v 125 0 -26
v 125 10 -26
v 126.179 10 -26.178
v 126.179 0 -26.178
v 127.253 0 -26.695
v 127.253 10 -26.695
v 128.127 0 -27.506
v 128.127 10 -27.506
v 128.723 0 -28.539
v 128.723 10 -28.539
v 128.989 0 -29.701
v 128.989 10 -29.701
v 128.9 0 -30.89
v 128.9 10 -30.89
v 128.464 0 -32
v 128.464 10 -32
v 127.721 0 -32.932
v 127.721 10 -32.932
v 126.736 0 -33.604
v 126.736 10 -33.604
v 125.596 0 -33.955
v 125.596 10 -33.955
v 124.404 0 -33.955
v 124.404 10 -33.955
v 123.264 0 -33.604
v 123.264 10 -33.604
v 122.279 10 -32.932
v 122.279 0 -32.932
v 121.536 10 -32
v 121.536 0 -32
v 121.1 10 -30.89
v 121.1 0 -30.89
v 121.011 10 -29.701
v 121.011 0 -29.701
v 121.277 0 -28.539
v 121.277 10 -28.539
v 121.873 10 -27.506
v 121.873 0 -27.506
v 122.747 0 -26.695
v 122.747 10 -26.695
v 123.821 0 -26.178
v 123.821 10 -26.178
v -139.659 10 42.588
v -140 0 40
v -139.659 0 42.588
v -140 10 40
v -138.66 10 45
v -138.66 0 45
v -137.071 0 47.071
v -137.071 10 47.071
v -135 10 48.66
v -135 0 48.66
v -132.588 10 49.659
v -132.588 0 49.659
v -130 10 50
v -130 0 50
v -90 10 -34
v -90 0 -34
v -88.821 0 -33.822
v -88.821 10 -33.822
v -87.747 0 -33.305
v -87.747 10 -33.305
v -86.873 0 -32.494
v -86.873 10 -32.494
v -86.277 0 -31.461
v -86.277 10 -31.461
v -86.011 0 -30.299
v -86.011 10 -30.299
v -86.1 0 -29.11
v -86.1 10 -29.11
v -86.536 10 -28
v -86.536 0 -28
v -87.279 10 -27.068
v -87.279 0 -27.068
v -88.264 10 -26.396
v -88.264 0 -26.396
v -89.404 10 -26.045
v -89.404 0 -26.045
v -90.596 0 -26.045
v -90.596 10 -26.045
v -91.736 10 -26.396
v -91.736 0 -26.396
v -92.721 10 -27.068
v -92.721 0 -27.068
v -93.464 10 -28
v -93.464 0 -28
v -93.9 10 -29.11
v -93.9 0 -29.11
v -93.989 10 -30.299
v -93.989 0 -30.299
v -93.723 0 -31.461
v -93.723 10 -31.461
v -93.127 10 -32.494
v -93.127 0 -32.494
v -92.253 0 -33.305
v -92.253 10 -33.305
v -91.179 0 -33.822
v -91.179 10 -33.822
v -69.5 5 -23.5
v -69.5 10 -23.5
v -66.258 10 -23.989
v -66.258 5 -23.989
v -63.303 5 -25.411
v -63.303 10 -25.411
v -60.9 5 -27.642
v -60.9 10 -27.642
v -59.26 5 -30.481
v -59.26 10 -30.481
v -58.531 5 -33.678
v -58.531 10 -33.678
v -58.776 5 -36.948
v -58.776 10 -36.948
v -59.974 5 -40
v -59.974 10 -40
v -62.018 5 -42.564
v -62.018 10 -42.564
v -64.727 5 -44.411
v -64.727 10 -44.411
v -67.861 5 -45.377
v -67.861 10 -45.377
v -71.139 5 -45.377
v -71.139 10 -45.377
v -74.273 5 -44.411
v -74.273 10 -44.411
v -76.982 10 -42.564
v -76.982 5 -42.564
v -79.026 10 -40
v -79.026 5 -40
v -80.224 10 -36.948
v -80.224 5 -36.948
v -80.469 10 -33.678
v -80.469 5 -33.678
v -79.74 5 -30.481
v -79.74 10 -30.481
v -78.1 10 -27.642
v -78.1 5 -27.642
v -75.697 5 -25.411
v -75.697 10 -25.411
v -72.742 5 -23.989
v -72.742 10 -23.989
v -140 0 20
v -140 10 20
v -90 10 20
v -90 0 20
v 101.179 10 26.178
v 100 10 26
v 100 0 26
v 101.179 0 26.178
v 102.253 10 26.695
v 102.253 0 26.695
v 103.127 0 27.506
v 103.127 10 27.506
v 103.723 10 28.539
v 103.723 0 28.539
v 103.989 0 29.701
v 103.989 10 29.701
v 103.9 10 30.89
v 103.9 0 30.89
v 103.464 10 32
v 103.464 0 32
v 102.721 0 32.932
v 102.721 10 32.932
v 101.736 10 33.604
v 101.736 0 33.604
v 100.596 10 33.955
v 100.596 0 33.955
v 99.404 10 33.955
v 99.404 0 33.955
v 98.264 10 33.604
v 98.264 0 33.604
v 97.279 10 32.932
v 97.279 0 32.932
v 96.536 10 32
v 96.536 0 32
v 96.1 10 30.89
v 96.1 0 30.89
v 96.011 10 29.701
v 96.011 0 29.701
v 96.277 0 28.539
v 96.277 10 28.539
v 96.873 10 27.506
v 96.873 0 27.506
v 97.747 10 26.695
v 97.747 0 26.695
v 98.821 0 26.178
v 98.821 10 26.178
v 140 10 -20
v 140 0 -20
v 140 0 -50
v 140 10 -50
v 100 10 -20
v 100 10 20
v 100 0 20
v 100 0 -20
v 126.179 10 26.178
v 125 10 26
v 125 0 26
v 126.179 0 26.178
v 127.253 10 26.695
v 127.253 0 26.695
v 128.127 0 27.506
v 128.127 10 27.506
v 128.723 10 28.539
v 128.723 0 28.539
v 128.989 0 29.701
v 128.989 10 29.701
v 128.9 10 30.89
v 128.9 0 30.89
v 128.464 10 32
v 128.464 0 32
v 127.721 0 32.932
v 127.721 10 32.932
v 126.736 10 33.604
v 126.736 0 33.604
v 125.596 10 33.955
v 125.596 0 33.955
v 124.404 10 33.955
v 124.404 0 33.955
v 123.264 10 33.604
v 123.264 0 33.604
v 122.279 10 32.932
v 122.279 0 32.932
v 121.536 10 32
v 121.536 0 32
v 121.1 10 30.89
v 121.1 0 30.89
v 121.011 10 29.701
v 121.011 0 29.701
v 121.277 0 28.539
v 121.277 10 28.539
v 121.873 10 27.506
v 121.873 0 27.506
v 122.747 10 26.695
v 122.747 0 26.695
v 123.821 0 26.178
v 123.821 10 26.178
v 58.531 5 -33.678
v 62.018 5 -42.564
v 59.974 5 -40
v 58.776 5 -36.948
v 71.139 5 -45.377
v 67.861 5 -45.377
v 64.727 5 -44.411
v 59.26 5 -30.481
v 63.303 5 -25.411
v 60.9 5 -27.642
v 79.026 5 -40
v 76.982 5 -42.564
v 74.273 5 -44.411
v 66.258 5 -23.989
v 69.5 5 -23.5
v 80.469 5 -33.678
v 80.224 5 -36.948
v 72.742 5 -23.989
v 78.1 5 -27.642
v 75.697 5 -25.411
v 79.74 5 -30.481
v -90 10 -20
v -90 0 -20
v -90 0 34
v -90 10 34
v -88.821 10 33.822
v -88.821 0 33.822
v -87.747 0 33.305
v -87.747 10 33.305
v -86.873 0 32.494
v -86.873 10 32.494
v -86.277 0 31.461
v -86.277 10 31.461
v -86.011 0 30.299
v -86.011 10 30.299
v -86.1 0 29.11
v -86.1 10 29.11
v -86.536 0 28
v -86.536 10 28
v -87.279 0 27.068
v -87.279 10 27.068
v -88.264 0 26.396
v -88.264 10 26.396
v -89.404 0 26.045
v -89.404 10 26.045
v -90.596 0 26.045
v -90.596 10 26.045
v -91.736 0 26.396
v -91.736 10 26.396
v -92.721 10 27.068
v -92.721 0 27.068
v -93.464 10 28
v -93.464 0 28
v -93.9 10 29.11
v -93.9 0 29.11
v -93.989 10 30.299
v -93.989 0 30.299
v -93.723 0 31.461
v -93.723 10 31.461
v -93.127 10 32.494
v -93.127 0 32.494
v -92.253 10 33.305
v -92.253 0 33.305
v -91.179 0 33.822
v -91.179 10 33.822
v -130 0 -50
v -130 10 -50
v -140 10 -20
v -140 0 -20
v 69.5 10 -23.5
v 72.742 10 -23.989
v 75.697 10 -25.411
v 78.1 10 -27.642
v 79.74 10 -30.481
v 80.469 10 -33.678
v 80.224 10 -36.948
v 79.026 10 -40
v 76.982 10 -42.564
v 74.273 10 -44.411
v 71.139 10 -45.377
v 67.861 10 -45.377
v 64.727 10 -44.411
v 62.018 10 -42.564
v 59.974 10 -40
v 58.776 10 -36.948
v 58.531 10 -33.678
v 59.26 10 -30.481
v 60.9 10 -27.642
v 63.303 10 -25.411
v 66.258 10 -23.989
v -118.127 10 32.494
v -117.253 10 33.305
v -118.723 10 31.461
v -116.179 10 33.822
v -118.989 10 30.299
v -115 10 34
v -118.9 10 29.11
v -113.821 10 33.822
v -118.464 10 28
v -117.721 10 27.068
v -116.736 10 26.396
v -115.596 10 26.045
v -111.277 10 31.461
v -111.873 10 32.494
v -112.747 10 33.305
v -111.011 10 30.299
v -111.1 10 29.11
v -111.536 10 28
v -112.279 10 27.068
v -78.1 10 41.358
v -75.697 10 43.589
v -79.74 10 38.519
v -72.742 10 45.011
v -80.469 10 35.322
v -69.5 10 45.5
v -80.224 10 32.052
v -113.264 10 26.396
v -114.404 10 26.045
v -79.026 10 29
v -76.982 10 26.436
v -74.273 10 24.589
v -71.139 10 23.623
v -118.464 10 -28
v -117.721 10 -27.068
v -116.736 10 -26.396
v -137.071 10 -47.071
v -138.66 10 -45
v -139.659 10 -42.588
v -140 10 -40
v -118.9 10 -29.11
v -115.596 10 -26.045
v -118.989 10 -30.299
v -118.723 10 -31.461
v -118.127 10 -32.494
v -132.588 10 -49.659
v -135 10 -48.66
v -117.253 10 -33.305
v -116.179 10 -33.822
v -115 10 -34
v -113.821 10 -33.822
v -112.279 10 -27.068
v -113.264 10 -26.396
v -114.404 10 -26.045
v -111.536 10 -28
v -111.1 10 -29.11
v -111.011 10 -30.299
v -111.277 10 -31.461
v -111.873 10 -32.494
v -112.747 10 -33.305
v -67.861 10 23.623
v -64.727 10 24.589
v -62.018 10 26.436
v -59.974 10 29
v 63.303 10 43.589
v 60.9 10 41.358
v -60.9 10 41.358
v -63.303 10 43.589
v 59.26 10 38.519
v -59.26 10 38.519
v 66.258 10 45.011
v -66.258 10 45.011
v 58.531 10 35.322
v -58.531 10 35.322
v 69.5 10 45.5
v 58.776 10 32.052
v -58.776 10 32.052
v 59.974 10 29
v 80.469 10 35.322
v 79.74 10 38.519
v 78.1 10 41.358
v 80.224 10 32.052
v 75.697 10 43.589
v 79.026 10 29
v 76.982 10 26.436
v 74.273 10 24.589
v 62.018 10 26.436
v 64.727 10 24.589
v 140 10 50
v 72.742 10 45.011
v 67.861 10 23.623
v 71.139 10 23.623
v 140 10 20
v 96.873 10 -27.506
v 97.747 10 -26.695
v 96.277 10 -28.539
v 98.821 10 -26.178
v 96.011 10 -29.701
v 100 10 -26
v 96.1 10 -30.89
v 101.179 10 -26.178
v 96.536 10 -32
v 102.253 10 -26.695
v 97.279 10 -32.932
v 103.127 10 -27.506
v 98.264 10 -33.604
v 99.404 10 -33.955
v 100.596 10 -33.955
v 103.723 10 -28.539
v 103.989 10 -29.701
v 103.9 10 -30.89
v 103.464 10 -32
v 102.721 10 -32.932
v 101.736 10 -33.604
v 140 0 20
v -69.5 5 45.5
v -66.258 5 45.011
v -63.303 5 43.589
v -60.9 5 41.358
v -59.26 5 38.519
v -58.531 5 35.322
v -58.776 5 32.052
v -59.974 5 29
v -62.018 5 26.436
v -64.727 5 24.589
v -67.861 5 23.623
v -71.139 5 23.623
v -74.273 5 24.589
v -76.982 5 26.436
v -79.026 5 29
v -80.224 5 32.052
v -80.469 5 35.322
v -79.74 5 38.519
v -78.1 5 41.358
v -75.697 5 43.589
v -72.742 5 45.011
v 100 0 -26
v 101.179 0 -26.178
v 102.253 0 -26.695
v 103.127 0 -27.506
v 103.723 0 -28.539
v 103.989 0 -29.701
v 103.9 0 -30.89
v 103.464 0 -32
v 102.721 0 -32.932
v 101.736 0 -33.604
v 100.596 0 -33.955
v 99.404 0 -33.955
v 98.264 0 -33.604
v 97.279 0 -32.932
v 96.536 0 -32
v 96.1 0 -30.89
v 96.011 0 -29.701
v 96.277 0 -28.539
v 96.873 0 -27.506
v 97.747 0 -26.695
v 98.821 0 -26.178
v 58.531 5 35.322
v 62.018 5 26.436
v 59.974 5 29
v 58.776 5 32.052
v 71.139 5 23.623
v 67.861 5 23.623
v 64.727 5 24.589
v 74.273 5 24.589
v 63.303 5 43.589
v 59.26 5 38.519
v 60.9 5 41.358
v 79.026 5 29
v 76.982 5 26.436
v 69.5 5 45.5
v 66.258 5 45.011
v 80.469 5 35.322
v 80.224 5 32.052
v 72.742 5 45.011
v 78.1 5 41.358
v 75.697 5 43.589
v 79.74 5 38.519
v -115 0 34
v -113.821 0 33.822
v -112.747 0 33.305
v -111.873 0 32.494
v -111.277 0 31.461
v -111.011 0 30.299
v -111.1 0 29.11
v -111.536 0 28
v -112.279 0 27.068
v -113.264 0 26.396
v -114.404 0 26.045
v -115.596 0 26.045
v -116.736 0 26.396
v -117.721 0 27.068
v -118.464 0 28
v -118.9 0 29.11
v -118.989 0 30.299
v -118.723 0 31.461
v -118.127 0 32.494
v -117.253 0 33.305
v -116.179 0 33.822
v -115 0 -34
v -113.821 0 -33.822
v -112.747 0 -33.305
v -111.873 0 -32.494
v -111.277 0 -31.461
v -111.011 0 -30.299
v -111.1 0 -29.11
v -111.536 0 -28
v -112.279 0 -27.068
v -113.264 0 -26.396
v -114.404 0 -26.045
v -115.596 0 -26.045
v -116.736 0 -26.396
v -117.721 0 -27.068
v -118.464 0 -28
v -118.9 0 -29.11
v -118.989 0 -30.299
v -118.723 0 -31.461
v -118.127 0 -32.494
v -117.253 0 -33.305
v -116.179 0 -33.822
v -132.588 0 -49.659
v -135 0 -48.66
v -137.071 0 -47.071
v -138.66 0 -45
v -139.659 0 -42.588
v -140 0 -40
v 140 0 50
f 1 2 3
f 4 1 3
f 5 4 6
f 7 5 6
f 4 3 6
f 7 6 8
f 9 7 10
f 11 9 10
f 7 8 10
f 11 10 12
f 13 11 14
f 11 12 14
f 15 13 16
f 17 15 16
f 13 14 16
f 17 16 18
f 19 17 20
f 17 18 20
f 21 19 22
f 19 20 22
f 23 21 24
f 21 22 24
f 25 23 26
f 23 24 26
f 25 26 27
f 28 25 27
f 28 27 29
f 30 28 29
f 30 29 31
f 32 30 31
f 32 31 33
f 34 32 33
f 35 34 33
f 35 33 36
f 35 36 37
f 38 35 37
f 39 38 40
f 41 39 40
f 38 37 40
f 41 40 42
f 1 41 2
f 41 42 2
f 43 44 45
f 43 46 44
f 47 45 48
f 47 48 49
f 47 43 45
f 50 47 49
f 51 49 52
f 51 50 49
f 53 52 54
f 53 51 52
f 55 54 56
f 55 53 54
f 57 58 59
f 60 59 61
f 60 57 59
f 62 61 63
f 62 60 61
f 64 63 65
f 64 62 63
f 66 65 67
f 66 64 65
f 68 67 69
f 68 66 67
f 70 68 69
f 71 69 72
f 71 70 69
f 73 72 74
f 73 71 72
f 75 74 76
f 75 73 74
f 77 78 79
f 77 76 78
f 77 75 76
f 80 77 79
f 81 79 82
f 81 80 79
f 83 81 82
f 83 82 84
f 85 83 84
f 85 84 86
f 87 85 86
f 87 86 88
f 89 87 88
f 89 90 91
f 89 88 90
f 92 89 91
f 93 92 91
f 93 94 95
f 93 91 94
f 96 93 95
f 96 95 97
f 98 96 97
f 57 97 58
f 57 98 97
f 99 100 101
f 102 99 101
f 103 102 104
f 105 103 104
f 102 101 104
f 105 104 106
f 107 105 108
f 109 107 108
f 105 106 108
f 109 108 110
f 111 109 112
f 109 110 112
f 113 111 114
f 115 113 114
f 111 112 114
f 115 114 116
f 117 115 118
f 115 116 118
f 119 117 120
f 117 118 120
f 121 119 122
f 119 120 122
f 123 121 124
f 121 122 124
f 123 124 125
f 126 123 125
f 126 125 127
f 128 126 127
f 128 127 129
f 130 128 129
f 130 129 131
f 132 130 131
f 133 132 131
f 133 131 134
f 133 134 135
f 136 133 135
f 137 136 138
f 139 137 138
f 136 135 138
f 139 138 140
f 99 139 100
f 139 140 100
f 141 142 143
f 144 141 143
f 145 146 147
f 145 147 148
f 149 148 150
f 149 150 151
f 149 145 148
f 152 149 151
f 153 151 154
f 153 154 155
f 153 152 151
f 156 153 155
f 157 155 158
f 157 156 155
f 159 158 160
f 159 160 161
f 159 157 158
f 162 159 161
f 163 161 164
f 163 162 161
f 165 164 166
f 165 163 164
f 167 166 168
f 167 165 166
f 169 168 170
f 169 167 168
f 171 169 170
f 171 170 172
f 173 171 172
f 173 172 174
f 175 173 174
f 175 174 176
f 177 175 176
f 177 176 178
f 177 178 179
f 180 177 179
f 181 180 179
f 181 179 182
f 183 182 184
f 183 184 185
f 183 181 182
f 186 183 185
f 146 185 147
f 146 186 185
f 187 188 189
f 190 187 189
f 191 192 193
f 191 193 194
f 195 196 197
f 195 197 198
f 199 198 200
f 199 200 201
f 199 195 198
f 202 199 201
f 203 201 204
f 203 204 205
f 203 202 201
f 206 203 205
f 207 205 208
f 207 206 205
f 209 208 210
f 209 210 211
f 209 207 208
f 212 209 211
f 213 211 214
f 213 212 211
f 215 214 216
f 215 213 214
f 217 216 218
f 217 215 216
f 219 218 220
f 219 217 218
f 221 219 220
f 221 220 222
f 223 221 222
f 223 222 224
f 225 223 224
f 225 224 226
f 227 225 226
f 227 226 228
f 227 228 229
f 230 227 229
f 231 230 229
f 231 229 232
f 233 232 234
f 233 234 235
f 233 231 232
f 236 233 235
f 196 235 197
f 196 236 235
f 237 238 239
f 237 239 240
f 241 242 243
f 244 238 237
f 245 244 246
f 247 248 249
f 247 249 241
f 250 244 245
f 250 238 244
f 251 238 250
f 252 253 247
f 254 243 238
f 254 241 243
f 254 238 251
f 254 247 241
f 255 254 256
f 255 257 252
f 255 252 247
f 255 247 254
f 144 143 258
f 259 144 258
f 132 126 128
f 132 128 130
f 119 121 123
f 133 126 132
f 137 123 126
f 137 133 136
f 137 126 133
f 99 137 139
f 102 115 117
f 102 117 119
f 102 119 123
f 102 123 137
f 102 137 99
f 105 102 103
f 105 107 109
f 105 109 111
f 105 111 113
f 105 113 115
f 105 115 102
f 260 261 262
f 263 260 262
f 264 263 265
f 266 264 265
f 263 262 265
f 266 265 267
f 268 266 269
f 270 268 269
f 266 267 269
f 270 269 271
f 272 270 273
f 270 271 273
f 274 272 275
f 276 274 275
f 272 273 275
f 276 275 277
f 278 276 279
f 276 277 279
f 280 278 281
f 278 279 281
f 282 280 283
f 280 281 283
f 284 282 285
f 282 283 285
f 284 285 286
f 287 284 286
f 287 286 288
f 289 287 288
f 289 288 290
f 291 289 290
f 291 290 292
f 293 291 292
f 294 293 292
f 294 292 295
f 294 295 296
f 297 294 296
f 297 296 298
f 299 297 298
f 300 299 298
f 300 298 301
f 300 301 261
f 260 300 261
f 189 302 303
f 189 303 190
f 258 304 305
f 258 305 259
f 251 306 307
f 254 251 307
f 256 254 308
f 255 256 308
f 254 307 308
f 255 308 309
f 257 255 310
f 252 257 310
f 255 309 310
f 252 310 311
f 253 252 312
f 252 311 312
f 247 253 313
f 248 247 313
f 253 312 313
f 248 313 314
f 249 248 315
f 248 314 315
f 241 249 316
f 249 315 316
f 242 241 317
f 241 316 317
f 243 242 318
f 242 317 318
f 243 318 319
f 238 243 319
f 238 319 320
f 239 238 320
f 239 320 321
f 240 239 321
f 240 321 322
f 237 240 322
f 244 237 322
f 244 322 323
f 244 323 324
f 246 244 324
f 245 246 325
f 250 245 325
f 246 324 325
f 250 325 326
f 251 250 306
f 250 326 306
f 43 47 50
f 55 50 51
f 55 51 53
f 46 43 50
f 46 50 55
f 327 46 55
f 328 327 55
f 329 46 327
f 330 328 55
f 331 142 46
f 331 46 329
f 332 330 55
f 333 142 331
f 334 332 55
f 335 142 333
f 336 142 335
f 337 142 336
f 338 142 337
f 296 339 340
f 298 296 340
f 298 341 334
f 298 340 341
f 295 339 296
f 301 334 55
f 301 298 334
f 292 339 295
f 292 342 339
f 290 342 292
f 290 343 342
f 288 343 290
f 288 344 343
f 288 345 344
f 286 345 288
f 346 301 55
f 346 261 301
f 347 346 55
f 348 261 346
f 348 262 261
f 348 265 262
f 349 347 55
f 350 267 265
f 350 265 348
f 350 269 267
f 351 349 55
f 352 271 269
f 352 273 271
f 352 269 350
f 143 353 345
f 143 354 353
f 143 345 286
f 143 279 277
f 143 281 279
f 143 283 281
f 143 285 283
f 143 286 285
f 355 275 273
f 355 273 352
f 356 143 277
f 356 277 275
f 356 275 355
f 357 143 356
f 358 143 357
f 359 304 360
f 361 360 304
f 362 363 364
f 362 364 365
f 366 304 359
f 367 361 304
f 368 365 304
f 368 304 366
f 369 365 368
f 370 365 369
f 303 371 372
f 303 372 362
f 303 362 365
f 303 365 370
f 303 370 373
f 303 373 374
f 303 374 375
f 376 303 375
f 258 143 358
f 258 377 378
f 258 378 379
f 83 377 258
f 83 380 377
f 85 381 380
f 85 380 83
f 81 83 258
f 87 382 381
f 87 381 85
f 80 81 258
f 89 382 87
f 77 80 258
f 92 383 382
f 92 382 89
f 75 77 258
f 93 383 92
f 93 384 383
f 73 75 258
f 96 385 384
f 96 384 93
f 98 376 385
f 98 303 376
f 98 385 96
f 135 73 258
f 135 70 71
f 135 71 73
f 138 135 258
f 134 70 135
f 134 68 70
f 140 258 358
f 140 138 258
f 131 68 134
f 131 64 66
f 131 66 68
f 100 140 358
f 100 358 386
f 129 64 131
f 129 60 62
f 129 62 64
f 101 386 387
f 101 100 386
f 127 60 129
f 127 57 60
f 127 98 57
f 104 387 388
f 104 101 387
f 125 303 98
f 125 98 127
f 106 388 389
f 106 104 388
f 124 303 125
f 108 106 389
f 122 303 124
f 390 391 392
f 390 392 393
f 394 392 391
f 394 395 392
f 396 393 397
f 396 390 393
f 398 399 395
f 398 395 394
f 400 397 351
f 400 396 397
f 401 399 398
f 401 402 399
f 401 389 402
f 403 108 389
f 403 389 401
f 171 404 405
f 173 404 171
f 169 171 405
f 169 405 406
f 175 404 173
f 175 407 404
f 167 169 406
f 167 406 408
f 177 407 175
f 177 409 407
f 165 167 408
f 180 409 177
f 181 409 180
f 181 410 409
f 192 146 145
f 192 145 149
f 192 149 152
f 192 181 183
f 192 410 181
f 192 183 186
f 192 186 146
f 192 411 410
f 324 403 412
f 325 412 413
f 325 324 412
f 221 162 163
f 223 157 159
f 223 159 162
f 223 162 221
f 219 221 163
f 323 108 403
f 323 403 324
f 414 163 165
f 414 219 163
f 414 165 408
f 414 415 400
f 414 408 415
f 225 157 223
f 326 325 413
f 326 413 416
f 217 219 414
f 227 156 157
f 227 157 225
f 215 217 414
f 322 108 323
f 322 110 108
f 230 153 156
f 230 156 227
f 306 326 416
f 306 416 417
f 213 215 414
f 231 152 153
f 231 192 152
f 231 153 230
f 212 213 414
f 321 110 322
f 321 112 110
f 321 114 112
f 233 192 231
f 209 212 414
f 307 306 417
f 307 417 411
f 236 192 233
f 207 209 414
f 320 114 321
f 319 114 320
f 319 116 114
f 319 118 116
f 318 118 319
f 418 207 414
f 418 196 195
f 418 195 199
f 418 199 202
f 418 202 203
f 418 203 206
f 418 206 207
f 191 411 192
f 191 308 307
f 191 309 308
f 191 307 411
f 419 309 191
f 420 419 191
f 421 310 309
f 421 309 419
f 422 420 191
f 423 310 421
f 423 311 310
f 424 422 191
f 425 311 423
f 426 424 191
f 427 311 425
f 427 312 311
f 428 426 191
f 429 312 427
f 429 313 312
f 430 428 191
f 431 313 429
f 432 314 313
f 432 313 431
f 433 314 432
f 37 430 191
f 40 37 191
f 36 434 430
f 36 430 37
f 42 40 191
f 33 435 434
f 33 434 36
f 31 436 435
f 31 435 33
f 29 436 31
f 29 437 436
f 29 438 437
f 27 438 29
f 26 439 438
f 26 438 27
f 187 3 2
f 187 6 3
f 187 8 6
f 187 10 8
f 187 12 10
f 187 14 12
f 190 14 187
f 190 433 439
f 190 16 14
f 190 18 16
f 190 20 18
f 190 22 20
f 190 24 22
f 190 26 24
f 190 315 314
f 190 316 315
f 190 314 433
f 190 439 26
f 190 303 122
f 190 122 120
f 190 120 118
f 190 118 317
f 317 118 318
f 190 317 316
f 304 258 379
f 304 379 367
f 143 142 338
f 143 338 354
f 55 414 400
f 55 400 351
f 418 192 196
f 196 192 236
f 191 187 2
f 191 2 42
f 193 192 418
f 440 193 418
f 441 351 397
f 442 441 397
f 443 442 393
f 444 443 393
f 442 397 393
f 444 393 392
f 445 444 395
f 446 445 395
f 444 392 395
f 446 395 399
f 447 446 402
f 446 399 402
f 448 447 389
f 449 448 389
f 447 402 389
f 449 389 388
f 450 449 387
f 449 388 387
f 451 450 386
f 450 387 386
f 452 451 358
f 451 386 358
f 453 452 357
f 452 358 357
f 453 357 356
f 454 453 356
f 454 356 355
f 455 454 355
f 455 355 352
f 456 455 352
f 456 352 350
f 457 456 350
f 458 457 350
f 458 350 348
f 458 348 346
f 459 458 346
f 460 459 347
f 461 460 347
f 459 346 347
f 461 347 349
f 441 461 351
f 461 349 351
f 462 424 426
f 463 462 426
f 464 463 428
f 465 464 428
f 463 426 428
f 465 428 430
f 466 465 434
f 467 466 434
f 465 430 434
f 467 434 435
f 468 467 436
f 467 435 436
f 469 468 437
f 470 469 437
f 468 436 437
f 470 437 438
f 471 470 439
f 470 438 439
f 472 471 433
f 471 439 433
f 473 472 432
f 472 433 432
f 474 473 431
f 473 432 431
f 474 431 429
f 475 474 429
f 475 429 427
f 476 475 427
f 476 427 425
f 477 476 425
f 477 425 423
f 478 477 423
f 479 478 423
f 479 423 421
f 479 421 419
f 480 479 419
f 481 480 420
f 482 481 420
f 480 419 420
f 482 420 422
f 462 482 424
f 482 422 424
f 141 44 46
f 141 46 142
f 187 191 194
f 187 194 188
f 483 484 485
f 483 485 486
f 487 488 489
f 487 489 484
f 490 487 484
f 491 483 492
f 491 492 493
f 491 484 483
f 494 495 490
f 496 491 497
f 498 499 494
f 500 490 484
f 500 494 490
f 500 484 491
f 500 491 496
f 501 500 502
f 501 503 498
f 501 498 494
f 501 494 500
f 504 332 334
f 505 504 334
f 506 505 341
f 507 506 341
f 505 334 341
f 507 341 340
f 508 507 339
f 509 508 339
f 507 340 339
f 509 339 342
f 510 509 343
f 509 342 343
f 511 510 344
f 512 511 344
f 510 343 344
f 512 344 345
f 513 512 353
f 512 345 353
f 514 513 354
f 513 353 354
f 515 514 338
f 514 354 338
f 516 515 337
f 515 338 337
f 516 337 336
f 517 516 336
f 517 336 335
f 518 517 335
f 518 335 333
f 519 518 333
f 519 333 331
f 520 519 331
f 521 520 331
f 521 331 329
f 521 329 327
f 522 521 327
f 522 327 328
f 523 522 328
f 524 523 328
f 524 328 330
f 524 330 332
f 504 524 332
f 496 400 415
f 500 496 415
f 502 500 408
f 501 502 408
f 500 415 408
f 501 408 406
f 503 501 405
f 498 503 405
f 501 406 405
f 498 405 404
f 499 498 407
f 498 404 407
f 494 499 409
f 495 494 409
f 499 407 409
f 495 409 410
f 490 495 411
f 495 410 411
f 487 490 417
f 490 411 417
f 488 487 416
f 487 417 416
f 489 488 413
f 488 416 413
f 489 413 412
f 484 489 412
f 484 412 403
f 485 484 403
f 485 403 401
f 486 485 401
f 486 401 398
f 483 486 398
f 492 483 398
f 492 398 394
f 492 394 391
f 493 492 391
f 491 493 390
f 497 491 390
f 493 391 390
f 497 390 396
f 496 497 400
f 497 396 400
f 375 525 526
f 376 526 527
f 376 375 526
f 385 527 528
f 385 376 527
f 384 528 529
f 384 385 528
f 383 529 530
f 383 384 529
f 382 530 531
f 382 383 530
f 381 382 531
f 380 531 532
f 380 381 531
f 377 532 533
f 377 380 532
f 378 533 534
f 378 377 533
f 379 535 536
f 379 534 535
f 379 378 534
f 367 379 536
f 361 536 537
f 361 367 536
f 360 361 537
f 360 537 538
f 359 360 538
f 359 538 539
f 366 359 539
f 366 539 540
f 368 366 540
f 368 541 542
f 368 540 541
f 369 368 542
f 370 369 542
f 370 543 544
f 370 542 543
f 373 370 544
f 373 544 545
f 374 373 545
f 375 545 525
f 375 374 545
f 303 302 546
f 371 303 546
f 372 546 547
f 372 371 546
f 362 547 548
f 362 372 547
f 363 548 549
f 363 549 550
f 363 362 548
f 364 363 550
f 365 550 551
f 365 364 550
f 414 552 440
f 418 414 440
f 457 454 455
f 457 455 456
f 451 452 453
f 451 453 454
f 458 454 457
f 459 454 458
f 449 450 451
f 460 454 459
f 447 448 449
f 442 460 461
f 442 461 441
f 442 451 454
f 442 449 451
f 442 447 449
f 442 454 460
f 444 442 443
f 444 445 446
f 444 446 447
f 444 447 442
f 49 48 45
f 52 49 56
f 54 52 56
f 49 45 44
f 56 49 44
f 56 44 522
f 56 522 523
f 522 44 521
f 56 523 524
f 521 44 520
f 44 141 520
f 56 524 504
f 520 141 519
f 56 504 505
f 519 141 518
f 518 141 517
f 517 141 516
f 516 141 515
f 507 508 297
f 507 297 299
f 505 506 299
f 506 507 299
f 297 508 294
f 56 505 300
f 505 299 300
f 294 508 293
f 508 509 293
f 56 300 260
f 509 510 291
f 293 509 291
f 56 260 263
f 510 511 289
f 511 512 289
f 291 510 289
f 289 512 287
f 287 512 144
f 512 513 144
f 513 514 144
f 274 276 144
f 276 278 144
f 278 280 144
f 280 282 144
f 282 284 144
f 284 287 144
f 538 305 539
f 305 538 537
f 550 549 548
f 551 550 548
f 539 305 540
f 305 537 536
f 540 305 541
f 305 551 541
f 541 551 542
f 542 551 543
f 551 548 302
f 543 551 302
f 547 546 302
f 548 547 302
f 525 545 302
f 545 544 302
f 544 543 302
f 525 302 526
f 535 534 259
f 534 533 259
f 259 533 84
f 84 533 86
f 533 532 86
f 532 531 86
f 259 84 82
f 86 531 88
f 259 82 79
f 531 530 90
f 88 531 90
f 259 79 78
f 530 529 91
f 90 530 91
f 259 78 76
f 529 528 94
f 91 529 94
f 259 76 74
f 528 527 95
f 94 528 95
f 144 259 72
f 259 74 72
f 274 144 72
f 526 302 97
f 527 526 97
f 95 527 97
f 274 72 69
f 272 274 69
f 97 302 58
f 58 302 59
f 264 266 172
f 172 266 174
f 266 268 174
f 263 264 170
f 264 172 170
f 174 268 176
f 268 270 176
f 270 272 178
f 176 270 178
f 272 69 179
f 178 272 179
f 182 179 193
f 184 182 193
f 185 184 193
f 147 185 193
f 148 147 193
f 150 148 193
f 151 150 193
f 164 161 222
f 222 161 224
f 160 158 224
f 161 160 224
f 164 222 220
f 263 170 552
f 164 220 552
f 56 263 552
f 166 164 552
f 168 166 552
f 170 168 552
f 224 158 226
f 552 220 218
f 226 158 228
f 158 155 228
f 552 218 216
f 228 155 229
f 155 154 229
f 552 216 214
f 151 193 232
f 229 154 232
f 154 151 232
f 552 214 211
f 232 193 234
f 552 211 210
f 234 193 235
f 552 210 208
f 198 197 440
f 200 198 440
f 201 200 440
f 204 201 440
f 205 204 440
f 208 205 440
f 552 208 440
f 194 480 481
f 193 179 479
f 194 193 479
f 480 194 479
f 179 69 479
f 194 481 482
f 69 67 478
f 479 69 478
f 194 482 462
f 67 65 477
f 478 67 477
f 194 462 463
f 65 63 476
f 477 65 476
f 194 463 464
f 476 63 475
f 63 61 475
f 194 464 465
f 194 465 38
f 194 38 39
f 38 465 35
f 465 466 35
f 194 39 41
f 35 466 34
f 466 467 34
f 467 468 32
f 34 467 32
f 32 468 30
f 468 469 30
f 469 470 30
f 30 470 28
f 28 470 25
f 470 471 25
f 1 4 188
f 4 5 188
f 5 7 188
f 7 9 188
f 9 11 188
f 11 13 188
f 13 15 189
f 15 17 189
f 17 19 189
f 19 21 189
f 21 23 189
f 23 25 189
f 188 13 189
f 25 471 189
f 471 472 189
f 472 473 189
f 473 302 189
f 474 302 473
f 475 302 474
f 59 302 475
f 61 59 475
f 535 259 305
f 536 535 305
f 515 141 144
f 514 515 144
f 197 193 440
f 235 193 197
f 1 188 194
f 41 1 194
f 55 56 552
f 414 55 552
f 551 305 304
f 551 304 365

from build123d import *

# Parameters (mm, degrees)
SKETCH_3_W          = 280
SKETCH_3_H          = 100
EXTRUDE_1_DEPTH     = 10
SKETCH_5_R          = 4
CUT_EXTRUDE_1_DEPTH = 149.996644258
SKETCH_6_R          = 4
CUT_EXTRUDE_2_DEPTH = 10
SKETCH_7_W          = 50
SKETCH_7_H          = 40
CUT_EXTRUDE_3_DEPTH = 149.996644258
FILLET_1_R          = 10
FILLET_2_R          = 10
SKETCH_8_W          = 40
SKETCH_8_H          = 40
CUT_EXTRUDE_4_DEPTH = 149.996644258
SKETCH_11_R         = 11
CUT_EXTRUDE_5_DEPTH = 5


with BuildPart() as part:
    # 草图3 → 凸台-拉伸1 (new body)
    with BuildSketch(Plane(origin=(0, 0, 0), x_dir=(1, 0, 0), z_dir=(0, 1, 0))):
        Rectangle(SKETCH_3_W, SKETCH_3_H)
    extrude(amount=EXTRUDE_1_DEPTH)

    # 草图5 → 切除-拉伸1 (cut, through all)
    with BuildSketch(Plane(origin=(0, 10, 0), x_dir=(1, 0, 0), z_dir=(0, 1, 0))):
        with Locations(Location((-115, -30, 0), (0, 0, 270))):
            Circle(SKETCH_5_R)
        with Locations(Location((-90, -30, 0), (0, 0, 270))):
            Circle(SKETCH_5_R)
    cut_extrude_1 = extrude(amount=-CUT_EXTRUDE_1_DEPTH, mode=Mode.SUBTRACT)

    # 镜向1: 切除-拉伸1 across plane
    add(cut_extrude_1.mirror(Plane.XY), mode=Mode.SUBTRACT)

    # 草图6 → 切除-拉伸2 (cut)
    with BuildSketch(Plane(origin=(0, 10, 0), x_dir=(1, 0, 0), z_dir=(0, 1, 0))):
        with Locations(Location((125, 30, 0), (0, 0, 270))):
            Circle(SKETCH_6_R)
        with Locations(Location((100, 30, 0), (0, 0, 270))):
            Circle(SKETCH_6_R)
    cut_extrude_2 = extrude(amount=-CUT_EXTRUDE_2_DEPTH, mode=Mode.SUBTRACT)

    # 镜向2: 切除-拉伸2 across plane
    add(cut_extrude_2.mirror(Plane.XY), mode=Mode.SUBTRACT)

    # 草图7 → 切除-拉伸3 (cut, through all)
    with BuildSketch(Plane(origin=(0, 10, 0), x_dir=(1, 0, 0), z_dir=(0, 1, 0))):
        with Locations((-115, 0)):
            Rectangle(SKETCH_7_W, SKETCH_7_H)
    extrude(amount=-CUT_EXTRUDE_3_DEPTH, mode=Mode.SUBTRACT)

    # 圆角1
    fillet_1_edges = [part.edges().sort_by_distance(p)[0] for p in [
        (-140, 5, 50),
    ]]
    fillet(fillet_1_edges, radius=FILLET_1_R)

    # 圆角2
    fillet_2_edges = [part.edges().sort_by_distance(p)[0] for p in [
        (-140, 5, -50),
    ]]
    fillet(fillet_2_edges, radius=FILLET_2_R)

    # 草图8 → 切除-拉伸4 (cut, through all)
    with BuildSketch(Plane(origin=(0, 10, 0), x_dir=(1, 0, 0), z_dir=(0, 1, 0))):
        with Locations((120, 0)):
            Rectangle(SKETCH_8_W, SKETCH_8_H)
    extrude(amount=-CUT_EXTRUDE_4_DEPTH, mode=Mode.SUBTRACT)

    # 草图11 → 切除-拉伸5 (cut)
    with BuildSketch(Plane(origin=(0, 10, 0), x_dir=(1, 0, 0), z_dir=(0, 1, 0))):
        with Locations(Location((-69.5, -34.5, 0), (0, 0, 270))):
            Circle(SKETCH_11_R)
        with Locations(Location((-69.5, 34.5, 0), (0, 0, 270))):
            Circle(SKETCH_11_R)
        with Locations(Location((69.5, 34.5, 0), (0, 0, 270))):
            Circle(SKETCH_11_R)
        with Locations(Location((69.5, -34.5, 0), (0, 0, 270))):
            Circle(SKETCH_11_R)
    extrude(amount=-CUT_EXTRUDE_5_DEPTH, mode=Mode.SUBTRACT)


solid = part.part
